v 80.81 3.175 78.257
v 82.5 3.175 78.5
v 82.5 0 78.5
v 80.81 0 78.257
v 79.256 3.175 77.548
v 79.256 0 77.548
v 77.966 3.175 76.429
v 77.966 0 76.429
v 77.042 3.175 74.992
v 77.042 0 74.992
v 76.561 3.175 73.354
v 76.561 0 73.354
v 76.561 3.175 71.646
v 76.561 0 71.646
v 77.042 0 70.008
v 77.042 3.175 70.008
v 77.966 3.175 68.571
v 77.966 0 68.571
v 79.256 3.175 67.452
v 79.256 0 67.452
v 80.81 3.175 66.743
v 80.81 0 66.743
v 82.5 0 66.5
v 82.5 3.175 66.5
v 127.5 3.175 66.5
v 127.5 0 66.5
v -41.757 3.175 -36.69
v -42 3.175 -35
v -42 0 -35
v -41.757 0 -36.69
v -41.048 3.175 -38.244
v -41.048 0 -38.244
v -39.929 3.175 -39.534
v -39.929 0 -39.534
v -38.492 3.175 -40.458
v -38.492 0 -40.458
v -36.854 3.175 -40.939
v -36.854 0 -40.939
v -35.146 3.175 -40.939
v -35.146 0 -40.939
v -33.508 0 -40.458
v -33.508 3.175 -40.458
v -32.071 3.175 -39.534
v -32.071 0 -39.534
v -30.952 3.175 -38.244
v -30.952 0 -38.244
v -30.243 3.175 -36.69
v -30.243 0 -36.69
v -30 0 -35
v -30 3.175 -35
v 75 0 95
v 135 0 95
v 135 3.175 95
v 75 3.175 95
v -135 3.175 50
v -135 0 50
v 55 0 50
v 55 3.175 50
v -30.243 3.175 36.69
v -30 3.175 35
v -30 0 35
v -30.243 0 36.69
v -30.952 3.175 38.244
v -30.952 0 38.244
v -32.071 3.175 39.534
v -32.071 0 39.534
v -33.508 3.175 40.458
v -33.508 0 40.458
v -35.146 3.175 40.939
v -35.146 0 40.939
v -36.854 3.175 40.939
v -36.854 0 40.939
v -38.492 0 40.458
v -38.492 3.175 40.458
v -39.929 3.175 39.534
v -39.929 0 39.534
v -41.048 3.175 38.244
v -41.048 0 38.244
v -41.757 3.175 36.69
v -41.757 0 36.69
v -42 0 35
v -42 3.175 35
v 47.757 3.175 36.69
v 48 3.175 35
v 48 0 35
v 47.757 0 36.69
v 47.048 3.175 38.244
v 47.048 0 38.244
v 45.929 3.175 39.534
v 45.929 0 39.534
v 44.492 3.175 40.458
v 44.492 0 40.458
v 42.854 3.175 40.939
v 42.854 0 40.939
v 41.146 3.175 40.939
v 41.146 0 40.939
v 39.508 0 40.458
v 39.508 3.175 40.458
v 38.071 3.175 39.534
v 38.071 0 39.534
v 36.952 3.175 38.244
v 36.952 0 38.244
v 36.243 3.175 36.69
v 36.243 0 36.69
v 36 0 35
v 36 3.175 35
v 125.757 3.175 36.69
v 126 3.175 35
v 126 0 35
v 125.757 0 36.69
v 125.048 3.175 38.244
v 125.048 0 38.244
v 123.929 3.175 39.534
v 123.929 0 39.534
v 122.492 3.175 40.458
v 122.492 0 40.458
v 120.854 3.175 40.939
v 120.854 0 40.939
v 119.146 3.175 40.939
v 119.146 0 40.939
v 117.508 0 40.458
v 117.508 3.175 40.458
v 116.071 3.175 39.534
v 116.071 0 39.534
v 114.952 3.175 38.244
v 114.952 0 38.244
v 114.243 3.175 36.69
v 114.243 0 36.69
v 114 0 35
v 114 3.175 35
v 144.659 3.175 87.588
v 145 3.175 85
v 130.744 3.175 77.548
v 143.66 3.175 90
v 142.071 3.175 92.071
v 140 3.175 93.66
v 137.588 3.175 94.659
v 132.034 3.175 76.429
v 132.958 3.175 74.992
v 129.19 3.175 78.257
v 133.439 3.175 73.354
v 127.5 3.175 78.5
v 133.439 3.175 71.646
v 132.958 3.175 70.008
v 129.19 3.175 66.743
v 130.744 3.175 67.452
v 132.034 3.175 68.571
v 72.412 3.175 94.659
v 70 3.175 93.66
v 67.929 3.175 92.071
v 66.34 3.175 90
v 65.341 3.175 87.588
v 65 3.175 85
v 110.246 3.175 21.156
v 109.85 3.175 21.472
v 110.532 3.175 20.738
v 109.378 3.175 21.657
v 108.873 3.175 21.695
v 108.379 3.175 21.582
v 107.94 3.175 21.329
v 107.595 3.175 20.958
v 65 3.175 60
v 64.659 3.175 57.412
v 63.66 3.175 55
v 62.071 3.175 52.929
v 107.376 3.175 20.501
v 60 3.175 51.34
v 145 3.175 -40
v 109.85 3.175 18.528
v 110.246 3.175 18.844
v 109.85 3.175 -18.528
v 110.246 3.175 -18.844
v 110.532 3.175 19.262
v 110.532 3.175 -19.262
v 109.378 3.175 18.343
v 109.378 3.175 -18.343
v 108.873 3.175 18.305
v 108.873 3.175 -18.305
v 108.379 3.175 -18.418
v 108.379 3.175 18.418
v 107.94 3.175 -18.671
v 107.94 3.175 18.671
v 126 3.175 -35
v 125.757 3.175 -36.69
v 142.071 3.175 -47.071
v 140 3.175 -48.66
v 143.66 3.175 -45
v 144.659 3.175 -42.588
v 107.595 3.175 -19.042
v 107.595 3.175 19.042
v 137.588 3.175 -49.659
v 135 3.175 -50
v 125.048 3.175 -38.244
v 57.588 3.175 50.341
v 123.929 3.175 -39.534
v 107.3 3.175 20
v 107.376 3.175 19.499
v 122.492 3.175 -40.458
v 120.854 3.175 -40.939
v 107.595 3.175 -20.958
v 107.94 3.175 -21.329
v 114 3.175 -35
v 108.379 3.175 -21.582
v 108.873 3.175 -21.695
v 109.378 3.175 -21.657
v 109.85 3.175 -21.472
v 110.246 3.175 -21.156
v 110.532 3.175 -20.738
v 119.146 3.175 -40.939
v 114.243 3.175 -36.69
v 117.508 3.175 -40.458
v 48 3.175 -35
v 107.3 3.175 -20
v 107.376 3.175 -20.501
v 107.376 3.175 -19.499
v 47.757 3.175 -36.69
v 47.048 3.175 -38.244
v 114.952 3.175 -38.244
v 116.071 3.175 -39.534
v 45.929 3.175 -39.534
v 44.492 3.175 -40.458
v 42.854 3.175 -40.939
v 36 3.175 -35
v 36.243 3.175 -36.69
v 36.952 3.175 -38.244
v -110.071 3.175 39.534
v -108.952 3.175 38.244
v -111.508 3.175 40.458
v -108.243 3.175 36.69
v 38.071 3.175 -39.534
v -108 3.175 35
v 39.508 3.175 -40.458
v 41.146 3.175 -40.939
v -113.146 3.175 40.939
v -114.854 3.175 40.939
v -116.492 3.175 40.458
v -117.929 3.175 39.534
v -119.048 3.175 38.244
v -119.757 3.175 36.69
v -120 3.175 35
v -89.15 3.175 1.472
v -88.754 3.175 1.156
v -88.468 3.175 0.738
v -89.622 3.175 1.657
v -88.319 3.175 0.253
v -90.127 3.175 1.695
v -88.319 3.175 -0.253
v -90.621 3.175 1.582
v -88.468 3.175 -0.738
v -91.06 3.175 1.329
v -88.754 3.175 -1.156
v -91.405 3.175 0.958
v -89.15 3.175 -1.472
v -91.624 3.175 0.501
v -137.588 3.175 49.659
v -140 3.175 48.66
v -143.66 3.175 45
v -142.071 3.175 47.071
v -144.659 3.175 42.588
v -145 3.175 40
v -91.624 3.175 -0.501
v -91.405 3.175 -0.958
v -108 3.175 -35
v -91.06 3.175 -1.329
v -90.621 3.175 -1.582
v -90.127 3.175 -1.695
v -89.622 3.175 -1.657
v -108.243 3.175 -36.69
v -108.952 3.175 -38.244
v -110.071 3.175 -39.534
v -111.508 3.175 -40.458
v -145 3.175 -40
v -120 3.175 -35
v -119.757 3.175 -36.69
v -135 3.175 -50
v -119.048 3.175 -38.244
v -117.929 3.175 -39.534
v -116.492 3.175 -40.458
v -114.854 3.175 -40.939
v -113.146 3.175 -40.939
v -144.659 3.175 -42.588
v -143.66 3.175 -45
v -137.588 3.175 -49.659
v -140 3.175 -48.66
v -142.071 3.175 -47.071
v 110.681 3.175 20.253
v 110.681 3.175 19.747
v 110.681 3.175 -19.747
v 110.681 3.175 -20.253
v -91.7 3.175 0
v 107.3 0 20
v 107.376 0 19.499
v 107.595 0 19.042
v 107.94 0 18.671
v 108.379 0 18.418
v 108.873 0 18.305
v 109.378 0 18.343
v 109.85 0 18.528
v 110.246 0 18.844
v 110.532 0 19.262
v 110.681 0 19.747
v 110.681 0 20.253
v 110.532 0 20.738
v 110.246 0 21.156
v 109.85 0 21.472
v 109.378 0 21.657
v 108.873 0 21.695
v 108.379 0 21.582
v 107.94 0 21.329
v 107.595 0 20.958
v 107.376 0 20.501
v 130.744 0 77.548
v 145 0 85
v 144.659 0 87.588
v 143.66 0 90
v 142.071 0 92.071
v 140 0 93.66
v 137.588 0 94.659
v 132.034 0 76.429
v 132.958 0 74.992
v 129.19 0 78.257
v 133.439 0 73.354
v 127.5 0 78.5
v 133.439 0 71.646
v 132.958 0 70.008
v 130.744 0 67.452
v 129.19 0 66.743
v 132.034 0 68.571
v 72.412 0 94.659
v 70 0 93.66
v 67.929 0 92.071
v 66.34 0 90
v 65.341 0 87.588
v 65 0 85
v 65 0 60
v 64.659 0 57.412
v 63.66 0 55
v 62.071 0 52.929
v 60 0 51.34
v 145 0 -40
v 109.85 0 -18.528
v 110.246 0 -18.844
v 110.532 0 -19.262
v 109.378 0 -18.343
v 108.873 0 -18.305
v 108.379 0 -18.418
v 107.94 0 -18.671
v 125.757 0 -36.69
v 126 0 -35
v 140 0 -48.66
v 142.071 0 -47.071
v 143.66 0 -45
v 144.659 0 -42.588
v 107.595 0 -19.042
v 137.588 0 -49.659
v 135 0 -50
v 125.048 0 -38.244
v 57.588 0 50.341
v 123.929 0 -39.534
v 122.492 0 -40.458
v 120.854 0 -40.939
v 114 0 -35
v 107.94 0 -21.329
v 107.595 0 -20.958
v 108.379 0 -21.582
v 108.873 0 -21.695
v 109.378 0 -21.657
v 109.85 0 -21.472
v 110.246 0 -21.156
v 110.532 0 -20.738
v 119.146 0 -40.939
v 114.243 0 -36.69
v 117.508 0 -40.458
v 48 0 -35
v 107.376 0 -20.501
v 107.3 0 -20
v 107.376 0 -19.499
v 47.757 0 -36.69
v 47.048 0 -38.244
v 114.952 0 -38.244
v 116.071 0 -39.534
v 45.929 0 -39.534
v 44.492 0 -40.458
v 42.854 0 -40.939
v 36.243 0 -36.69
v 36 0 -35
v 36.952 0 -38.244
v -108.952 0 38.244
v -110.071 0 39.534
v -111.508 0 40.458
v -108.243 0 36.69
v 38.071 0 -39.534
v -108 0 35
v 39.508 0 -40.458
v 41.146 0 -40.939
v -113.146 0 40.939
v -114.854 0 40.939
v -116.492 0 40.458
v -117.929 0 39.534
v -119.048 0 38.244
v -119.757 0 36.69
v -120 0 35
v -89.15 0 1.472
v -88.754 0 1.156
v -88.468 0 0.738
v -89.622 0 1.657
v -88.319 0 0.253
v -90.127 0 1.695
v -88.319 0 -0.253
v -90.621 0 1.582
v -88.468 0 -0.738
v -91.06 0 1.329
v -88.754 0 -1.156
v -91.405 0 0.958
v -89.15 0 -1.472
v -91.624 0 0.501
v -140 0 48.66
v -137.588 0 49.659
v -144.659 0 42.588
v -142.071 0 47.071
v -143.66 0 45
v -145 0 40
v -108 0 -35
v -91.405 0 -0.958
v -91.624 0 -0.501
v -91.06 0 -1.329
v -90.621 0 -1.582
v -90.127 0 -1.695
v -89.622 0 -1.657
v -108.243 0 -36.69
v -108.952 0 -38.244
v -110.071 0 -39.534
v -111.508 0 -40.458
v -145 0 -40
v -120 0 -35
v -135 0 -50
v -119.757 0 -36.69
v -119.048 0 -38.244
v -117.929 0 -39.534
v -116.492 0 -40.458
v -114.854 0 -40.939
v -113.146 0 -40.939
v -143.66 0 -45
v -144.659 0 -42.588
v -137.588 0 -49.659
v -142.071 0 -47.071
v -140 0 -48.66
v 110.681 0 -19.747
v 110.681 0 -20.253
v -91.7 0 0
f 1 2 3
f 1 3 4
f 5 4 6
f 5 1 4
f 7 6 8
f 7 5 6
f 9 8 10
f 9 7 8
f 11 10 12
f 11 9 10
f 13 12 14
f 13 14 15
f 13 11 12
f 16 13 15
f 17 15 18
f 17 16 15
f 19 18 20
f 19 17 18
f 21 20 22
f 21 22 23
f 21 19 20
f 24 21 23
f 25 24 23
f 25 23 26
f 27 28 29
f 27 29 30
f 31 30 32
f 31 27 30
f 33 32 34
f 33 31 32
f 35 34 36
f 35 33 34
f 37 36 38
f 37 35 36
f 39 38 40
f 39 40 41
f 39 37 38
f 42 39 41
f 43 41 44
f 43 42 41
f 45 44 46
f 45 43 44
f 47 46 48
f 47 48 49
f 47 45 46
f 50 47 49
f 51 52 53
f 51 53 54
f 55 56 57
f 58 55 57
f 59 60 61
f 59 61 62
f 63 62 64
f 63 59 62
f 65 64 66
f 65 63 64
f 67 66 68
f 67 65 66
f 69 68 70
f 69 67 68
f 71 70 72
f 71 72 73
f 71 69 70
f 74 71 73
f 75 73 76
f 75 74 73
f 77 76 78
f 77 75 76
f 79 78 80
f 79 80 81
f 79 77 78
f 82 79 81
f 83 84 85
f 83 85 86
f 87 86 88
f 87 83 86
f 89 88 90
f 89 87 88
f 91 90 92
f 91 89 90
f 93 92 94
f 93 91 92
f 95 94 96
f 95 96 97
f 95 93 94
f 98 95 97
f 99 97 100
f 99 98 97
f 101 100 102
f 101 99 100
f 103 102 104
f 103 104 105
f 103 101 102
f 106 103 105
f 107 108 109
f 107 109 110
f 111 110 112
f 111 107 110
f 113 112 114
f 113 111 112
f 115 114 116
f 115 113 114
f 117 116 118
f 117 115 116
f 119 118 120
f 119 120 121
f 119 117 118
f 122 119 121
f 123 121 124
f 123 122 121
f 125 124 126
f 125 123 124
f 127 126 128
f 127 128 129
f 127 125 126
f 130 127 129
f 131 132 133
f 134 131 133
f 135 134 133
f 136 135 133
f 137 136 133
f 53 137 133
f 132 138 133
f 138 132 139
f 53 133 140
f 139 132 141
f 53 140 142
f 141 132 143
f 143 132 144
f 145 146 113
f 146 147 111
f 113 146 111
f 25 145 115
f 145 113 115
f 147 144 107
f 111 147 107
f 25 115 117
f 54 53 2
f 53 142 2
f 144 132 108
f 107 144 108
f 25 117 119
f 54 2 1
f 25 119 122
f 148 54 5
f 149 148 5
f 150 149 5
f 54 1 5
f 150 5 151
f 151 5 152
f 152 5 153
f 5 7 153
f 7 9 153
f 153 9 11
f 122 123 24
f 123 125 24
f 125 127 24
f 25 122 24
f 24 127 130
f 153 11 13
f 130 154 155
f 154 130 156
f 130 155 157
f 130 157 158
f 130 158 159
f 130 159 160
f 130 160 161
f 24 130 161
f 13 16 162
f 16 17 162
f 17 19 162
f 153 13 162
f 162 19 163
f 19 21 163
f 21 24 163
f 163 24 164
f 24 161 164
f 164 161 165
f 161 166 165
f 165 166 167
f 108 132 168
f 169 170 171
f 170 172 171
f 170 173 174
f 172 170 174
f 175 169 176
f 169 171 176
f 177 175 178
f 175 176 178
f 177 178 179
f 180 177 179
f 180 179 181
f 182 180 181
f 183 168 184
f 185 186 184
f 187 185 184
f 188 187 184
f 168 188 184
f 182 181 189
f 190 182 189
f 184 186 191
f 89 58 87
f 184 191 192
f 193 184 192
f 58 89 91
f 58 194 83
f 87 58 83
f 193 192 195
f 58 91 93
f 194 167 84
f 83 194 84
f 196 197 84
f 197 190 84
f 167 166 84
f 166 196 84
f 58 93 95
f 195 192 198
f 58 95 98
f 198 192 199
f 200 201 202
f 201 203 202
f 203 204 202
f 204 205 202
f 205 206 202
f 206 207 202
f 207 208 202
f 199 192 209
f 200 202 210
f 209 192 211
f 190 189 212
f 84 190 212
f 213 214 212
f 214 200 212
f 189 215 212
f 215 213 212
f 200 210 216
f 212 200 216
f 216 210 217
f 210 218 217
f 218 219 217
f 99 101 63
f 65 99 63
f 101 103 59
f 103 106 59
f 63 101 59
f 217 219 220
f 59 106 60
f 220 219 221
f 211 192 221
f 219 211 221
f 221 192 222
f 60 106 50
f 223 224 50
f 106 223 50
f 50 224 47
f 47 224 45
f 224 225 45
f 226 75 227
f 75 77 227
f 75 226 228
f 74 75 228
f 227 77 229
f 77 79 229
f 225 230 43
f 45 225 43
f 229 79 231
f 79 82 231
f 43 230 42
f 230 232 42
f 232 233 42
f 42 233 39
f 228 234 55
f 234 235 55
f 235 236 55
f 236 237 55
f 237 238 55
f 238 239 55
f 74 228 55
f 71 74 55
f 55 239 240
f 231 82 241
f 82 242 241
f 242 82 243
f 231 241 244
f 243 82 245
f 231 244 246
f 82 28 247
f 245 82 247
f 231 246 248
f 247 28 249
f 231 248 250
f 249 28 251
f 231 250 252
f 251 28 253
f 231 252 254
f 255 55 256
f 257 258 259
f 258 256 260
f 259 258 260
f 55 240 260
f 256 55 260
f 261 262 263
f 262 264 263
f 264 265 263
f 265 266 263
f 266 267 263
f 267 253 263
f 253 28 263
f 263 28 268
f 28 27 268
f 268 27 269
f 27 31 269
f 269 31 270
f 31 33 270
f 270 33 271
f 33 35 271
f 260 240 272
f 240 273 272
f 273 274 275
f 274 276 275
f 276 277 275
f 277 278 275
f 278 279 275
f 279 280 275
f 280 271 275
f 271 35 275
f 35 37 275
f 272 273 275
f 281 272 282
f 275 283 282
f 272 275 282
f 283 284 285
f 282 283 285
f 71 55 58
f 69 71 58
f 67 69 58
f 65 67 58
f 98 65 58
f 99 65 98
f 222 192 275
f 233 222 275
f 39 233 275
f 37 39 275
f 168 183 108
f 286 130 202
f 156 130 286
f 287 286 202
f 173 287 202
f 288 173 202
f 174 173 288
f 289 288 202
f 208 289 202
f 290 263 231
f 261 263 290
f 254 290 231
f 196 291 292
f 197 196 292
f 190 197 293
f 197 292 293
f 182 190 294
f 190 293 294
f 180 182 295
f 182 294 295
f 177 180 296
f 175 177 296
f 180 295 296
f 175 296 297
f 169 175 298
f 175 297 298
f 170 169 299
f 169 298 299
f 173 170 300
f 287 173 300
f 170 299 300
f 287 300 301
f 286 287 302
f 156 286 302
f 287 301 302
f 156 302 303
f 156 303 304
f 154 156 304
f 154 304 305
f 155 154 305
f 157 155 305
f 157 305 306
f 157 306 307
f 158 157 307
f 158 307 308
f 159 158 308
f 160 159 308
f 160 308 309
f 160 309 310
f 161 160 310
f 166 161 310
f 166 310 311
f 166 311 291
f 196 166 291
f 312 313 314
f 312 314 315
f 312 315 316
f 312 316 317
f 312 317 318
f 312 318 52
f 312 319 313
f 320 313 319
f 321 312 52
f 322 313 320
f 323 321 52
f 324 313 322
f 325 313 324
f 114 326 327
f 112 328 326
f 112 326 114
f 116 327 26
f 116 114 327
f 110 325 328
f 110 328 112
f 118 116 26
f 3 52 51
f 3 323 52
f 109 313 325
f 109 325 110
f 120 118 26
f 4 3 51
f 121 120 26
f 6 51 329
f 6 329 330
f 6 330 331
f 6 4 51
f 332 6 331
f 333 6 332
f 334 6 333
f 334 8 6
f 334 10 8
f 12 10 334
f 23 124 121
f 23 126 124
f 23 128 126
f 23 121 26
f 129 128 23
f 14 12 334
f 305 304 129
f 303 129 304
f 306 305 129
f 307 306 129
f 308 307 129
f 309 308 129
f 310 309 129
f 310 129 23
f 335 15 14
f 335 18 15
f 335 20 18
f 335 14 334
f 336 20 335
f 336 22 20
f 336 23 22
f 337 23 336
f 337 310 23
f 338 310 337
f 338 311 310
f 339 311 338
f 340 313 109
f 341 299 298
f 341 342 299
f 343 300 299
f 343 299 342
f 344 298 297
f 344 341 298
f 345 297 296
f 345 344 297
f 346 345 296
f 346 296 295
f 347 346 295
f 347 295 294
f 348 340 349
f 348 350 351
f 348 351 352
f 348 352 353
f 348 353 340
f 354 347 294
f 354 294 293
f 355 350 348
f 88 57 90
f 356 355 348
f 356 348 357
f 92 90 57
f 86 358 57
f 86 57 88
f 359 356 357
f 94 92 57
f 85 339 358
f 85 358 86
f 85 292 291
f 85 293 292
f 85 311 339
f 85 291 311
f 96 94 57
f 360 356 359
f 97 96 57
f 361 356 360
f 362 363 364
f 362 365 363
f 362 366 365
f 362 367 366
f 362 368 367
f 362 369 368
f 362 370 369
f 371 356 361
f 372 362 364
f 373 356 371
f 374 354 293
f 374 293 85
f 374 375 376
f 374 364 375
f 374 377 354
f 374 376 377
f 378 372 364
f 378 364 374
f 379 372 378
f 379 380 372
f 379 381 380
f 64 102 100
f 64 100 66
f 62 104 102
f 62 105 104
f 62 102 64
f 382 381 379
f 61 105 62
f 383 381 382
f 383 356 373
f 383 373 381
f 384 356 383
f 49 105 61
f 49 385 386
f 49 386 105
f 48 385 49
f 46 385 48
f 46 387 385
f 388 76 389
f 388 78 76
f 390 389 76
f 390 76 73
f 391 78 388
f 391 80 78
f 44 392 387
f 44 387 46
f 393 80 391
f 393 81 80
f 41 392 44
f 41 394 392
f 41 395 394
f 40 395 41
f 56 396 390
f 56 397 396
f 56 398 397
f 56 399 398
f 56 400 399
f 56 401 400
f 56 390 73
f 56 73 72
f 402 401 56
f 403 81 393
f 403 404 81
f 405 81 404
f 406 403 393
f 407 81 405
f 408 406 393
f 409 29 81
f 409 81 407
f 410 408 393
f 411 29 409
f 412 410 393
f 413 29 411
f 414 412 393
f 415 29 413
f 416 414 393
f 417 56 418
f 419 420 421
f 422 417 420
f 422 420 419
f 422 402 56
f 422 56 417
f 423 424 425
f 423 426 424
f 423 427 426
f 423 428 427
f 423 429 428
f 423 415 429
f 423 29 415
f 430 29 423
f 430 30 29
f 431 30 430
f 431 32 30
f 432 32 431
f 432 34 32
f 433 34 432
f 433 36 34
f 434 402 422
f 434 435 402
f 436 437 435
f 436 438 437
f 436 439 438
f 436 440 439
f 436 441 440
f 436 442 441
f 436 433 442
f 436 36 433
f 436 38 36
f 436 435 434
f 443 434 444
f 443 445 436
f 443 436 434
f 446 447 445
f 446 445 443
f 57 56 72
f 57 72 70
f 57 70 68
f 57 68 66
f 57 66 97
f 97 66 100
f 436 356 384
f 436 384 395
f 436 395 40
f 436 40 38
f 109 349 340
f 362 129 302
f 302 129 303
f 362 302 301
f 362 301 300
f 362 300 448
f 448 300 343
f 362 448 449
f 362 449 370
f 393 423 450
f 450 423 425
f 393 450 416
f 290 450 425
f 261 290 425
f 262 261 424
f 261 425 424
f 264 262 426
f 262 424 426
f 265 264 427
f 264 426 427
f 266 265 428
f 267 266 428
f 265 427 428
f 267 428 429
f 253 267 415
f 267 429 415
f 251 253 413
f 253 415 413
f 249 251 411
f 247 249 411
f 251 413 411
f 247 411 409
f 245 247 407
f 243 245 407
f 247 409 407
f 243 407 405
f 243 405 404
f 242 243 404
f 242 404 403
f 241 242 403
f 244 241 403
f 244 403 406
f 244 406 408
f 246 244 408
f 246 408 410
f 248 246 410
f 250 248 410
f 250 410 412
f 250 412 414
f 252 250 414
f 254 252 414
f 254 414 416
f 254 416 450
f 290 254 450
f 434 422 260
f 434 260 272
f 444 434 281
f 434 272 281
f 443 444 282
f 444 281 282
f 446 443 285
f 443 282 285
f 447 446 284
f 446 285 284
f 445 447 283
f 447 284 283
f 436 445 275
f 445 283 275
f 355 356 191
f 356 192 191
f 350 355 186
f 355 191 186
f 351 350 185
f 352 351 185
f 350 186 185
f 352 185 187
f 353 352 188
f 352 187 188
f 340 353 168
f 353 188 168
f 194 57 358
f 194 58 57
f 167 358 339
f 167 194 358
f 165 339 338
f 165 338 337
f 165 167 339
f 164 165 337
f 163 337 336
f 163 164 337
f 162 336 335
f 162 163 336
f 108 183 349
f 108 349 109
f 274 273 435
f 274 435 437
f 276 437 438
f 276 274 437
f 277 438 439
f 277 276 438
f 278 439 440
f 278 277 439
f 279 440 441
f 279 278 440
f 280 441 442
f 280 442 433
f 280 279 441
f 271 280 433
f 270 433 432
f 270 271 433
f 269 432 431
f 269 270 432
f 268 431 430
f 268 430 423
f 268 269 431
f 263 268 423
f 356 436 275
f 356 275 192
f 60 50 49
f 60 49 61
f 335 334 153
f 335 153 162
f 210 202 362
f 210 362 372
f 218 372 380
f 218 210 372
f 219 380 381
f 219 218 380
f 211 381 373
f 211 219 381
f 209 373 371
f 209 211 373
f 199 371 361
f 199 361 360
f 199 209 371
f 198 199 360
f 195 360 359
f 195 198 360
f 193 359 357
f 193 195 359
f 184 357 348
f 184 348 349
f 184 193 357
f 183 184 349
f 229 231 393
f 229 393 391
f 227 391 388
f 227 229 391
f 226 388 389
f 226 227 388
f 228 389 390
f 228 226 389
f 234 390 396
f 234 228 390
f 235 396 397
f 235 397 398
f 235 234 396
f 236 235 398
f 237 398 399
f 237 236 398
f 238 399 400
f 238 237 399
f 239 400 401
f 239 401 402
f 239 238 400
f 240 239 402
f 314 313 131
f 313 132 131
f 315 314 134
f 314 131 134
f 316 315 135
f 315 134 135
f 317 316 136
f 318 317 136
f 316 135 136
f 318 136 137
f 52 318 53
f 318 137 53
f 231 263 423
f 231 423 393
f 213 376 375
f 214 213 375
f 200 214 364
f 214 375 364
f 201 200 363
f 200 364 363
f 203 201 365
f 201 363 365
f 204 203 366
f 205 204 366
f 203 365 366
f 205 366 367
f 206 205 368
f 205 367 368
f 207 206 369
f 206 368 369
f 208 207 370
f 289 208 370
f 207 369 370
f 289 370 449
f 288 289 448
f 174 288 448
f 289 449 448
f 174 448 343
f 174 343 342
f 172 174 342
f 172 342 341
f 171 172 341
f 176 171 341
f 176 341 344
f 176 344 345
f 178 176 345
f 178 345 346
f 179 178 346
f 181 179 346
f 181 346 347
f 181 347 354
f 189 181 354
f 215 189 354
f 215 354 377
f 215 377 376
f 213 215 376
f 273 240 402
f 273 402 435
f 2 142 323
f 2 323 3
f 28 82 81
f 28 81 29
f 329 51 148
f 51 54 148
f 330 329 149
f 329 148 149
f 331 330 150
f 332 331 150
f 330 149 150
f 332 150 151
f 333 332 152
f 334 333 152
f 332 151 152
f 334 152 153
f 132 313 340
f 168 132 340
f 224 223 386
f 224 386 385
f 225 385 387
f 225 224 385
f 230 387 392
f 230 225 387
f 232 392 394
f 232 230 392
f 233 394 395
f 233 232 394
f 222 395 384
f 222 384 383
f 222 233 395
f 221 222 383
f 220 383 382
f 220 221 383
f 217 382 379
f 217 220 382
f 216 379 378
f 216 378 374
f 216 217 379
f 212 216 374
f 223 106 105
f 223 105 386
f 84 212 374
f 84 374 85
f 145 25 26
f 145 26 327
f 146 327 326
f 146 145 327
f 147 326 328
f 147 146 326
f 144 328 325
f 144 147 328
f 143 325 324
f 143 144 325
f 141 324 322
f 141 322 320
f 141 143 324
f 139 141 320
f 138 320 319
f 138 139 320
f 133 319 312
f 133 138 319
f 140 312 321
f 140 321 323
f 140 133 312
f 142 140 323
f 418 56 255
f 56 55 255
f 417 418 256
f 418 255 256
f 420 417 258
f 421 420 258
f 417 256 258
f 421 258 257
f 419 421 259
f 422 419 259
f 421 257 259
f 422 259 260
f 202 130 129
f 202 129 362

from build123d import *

# Parameters (mm, degrees)
BOSS_EXTRUDE1_DEPTH = 3.175
FILLET1_R           = 10
STANDOFF_HOLES_D    = 3.4
CUT_EXTRUDE1_DEPTH  = 3.175


with BuildPart() as part:
    # Sketch1 → Boss-Extrude1 (new body)
    with BuildSketch(Plane(origin=(0, 0, 0), x_dir=(1, 0, 0), z_dir=(0, 1, 0))):
        Polygon((-37.5, -50), (-145, -50), (-145, 50), (145, 50), (145, -50), (145, -95), (65, -95), (65, -50), (37.5, -50), align=None)
    extrude(amount=BOSS_EXTRUDE1_DEPTH)

    # Fillet1
    fillet1_edges = [part.edges().sort_by_distance(p)[0] for p in [
        (-145, 1.5875, 50),
        (-145, 1.5875, -50),
        (145, 1.5875, -50),
        (145, 1.5875, 95),
        (65, 1.5875, 95),
        (65, 1.5875, 50),
    ]]
    fillet(fillet1_edges, radius=FILLET1_R)

    # standoff holes (through all)
    with Locations(Plane(origin=(0, 3.175, 0), x_dir=(1, 0, 0), z_dir=(0, 1, 0))):
        with Locations((-90, 0), (109, 20), (109, -20)):
            Hole(STANDOFF_HOLES_D / 2)

    # Sketch6 → Cut-Extrude1 (cut)
    with BuildSketch(Plane(origin=(0, 3.175, 0), x_dir=(1, 0, 0), z_dir=(0, 1, 0))):
        with BuildLine():
            Line((-108, 35), (-108, -35))
            ThreePointArc((-108, -35), (-114, -41), (-120, -35))
            Line((-120, -35), (-120, 35))
            ThreePointArc((-120, 35), (-114, 41), (-108, 35))
        make_face()
        with BuildLine():
            Line((-30, 35), (-30, -35))
            ThreePointArc((-30, -35), (-36, -41), (-42, -35))
            Line((-42, -35), (-42, 35))
            ThreePointArc((-42, 35), (-36, 41), (-30, 35))
        make_face()
        with BuildLine():
            Line((48, 35), (48, -35))
            ThreePointArc((48, -35), (42, -41), (36, -35))
            Line((36, -35), (36, 35))
            ThreePointArc((36, 35), (42, 41), (48, 35))
        make_face()
        with BuildLine():
            Line((126, 35), (126, -35))
            ThreePointArc((126, -35), (120, -41), (114, -35))
            Line((114, -35), (114, 35))
            ThreePointArc((114, 35), (120, 41), (126, 35))
        make_face()
        with BuildLine():
            Line((82.5, -66.5), (127.5, -66.5))
            ThreePointArc((127.5, -66.5), (133.5, -72.5), (127.5, -78.5))
            Line((127.5, -78.5), (82.5, -78.5))
            ThreePointArc((82.5, -78.5), (76.5, -72.5), (82.5, -66.5))
        make_face()
    extrude(amount=-CUT_EXTRUDE1_DEPTH, mode=Mode.SUBTRACT)


solid = part.part
